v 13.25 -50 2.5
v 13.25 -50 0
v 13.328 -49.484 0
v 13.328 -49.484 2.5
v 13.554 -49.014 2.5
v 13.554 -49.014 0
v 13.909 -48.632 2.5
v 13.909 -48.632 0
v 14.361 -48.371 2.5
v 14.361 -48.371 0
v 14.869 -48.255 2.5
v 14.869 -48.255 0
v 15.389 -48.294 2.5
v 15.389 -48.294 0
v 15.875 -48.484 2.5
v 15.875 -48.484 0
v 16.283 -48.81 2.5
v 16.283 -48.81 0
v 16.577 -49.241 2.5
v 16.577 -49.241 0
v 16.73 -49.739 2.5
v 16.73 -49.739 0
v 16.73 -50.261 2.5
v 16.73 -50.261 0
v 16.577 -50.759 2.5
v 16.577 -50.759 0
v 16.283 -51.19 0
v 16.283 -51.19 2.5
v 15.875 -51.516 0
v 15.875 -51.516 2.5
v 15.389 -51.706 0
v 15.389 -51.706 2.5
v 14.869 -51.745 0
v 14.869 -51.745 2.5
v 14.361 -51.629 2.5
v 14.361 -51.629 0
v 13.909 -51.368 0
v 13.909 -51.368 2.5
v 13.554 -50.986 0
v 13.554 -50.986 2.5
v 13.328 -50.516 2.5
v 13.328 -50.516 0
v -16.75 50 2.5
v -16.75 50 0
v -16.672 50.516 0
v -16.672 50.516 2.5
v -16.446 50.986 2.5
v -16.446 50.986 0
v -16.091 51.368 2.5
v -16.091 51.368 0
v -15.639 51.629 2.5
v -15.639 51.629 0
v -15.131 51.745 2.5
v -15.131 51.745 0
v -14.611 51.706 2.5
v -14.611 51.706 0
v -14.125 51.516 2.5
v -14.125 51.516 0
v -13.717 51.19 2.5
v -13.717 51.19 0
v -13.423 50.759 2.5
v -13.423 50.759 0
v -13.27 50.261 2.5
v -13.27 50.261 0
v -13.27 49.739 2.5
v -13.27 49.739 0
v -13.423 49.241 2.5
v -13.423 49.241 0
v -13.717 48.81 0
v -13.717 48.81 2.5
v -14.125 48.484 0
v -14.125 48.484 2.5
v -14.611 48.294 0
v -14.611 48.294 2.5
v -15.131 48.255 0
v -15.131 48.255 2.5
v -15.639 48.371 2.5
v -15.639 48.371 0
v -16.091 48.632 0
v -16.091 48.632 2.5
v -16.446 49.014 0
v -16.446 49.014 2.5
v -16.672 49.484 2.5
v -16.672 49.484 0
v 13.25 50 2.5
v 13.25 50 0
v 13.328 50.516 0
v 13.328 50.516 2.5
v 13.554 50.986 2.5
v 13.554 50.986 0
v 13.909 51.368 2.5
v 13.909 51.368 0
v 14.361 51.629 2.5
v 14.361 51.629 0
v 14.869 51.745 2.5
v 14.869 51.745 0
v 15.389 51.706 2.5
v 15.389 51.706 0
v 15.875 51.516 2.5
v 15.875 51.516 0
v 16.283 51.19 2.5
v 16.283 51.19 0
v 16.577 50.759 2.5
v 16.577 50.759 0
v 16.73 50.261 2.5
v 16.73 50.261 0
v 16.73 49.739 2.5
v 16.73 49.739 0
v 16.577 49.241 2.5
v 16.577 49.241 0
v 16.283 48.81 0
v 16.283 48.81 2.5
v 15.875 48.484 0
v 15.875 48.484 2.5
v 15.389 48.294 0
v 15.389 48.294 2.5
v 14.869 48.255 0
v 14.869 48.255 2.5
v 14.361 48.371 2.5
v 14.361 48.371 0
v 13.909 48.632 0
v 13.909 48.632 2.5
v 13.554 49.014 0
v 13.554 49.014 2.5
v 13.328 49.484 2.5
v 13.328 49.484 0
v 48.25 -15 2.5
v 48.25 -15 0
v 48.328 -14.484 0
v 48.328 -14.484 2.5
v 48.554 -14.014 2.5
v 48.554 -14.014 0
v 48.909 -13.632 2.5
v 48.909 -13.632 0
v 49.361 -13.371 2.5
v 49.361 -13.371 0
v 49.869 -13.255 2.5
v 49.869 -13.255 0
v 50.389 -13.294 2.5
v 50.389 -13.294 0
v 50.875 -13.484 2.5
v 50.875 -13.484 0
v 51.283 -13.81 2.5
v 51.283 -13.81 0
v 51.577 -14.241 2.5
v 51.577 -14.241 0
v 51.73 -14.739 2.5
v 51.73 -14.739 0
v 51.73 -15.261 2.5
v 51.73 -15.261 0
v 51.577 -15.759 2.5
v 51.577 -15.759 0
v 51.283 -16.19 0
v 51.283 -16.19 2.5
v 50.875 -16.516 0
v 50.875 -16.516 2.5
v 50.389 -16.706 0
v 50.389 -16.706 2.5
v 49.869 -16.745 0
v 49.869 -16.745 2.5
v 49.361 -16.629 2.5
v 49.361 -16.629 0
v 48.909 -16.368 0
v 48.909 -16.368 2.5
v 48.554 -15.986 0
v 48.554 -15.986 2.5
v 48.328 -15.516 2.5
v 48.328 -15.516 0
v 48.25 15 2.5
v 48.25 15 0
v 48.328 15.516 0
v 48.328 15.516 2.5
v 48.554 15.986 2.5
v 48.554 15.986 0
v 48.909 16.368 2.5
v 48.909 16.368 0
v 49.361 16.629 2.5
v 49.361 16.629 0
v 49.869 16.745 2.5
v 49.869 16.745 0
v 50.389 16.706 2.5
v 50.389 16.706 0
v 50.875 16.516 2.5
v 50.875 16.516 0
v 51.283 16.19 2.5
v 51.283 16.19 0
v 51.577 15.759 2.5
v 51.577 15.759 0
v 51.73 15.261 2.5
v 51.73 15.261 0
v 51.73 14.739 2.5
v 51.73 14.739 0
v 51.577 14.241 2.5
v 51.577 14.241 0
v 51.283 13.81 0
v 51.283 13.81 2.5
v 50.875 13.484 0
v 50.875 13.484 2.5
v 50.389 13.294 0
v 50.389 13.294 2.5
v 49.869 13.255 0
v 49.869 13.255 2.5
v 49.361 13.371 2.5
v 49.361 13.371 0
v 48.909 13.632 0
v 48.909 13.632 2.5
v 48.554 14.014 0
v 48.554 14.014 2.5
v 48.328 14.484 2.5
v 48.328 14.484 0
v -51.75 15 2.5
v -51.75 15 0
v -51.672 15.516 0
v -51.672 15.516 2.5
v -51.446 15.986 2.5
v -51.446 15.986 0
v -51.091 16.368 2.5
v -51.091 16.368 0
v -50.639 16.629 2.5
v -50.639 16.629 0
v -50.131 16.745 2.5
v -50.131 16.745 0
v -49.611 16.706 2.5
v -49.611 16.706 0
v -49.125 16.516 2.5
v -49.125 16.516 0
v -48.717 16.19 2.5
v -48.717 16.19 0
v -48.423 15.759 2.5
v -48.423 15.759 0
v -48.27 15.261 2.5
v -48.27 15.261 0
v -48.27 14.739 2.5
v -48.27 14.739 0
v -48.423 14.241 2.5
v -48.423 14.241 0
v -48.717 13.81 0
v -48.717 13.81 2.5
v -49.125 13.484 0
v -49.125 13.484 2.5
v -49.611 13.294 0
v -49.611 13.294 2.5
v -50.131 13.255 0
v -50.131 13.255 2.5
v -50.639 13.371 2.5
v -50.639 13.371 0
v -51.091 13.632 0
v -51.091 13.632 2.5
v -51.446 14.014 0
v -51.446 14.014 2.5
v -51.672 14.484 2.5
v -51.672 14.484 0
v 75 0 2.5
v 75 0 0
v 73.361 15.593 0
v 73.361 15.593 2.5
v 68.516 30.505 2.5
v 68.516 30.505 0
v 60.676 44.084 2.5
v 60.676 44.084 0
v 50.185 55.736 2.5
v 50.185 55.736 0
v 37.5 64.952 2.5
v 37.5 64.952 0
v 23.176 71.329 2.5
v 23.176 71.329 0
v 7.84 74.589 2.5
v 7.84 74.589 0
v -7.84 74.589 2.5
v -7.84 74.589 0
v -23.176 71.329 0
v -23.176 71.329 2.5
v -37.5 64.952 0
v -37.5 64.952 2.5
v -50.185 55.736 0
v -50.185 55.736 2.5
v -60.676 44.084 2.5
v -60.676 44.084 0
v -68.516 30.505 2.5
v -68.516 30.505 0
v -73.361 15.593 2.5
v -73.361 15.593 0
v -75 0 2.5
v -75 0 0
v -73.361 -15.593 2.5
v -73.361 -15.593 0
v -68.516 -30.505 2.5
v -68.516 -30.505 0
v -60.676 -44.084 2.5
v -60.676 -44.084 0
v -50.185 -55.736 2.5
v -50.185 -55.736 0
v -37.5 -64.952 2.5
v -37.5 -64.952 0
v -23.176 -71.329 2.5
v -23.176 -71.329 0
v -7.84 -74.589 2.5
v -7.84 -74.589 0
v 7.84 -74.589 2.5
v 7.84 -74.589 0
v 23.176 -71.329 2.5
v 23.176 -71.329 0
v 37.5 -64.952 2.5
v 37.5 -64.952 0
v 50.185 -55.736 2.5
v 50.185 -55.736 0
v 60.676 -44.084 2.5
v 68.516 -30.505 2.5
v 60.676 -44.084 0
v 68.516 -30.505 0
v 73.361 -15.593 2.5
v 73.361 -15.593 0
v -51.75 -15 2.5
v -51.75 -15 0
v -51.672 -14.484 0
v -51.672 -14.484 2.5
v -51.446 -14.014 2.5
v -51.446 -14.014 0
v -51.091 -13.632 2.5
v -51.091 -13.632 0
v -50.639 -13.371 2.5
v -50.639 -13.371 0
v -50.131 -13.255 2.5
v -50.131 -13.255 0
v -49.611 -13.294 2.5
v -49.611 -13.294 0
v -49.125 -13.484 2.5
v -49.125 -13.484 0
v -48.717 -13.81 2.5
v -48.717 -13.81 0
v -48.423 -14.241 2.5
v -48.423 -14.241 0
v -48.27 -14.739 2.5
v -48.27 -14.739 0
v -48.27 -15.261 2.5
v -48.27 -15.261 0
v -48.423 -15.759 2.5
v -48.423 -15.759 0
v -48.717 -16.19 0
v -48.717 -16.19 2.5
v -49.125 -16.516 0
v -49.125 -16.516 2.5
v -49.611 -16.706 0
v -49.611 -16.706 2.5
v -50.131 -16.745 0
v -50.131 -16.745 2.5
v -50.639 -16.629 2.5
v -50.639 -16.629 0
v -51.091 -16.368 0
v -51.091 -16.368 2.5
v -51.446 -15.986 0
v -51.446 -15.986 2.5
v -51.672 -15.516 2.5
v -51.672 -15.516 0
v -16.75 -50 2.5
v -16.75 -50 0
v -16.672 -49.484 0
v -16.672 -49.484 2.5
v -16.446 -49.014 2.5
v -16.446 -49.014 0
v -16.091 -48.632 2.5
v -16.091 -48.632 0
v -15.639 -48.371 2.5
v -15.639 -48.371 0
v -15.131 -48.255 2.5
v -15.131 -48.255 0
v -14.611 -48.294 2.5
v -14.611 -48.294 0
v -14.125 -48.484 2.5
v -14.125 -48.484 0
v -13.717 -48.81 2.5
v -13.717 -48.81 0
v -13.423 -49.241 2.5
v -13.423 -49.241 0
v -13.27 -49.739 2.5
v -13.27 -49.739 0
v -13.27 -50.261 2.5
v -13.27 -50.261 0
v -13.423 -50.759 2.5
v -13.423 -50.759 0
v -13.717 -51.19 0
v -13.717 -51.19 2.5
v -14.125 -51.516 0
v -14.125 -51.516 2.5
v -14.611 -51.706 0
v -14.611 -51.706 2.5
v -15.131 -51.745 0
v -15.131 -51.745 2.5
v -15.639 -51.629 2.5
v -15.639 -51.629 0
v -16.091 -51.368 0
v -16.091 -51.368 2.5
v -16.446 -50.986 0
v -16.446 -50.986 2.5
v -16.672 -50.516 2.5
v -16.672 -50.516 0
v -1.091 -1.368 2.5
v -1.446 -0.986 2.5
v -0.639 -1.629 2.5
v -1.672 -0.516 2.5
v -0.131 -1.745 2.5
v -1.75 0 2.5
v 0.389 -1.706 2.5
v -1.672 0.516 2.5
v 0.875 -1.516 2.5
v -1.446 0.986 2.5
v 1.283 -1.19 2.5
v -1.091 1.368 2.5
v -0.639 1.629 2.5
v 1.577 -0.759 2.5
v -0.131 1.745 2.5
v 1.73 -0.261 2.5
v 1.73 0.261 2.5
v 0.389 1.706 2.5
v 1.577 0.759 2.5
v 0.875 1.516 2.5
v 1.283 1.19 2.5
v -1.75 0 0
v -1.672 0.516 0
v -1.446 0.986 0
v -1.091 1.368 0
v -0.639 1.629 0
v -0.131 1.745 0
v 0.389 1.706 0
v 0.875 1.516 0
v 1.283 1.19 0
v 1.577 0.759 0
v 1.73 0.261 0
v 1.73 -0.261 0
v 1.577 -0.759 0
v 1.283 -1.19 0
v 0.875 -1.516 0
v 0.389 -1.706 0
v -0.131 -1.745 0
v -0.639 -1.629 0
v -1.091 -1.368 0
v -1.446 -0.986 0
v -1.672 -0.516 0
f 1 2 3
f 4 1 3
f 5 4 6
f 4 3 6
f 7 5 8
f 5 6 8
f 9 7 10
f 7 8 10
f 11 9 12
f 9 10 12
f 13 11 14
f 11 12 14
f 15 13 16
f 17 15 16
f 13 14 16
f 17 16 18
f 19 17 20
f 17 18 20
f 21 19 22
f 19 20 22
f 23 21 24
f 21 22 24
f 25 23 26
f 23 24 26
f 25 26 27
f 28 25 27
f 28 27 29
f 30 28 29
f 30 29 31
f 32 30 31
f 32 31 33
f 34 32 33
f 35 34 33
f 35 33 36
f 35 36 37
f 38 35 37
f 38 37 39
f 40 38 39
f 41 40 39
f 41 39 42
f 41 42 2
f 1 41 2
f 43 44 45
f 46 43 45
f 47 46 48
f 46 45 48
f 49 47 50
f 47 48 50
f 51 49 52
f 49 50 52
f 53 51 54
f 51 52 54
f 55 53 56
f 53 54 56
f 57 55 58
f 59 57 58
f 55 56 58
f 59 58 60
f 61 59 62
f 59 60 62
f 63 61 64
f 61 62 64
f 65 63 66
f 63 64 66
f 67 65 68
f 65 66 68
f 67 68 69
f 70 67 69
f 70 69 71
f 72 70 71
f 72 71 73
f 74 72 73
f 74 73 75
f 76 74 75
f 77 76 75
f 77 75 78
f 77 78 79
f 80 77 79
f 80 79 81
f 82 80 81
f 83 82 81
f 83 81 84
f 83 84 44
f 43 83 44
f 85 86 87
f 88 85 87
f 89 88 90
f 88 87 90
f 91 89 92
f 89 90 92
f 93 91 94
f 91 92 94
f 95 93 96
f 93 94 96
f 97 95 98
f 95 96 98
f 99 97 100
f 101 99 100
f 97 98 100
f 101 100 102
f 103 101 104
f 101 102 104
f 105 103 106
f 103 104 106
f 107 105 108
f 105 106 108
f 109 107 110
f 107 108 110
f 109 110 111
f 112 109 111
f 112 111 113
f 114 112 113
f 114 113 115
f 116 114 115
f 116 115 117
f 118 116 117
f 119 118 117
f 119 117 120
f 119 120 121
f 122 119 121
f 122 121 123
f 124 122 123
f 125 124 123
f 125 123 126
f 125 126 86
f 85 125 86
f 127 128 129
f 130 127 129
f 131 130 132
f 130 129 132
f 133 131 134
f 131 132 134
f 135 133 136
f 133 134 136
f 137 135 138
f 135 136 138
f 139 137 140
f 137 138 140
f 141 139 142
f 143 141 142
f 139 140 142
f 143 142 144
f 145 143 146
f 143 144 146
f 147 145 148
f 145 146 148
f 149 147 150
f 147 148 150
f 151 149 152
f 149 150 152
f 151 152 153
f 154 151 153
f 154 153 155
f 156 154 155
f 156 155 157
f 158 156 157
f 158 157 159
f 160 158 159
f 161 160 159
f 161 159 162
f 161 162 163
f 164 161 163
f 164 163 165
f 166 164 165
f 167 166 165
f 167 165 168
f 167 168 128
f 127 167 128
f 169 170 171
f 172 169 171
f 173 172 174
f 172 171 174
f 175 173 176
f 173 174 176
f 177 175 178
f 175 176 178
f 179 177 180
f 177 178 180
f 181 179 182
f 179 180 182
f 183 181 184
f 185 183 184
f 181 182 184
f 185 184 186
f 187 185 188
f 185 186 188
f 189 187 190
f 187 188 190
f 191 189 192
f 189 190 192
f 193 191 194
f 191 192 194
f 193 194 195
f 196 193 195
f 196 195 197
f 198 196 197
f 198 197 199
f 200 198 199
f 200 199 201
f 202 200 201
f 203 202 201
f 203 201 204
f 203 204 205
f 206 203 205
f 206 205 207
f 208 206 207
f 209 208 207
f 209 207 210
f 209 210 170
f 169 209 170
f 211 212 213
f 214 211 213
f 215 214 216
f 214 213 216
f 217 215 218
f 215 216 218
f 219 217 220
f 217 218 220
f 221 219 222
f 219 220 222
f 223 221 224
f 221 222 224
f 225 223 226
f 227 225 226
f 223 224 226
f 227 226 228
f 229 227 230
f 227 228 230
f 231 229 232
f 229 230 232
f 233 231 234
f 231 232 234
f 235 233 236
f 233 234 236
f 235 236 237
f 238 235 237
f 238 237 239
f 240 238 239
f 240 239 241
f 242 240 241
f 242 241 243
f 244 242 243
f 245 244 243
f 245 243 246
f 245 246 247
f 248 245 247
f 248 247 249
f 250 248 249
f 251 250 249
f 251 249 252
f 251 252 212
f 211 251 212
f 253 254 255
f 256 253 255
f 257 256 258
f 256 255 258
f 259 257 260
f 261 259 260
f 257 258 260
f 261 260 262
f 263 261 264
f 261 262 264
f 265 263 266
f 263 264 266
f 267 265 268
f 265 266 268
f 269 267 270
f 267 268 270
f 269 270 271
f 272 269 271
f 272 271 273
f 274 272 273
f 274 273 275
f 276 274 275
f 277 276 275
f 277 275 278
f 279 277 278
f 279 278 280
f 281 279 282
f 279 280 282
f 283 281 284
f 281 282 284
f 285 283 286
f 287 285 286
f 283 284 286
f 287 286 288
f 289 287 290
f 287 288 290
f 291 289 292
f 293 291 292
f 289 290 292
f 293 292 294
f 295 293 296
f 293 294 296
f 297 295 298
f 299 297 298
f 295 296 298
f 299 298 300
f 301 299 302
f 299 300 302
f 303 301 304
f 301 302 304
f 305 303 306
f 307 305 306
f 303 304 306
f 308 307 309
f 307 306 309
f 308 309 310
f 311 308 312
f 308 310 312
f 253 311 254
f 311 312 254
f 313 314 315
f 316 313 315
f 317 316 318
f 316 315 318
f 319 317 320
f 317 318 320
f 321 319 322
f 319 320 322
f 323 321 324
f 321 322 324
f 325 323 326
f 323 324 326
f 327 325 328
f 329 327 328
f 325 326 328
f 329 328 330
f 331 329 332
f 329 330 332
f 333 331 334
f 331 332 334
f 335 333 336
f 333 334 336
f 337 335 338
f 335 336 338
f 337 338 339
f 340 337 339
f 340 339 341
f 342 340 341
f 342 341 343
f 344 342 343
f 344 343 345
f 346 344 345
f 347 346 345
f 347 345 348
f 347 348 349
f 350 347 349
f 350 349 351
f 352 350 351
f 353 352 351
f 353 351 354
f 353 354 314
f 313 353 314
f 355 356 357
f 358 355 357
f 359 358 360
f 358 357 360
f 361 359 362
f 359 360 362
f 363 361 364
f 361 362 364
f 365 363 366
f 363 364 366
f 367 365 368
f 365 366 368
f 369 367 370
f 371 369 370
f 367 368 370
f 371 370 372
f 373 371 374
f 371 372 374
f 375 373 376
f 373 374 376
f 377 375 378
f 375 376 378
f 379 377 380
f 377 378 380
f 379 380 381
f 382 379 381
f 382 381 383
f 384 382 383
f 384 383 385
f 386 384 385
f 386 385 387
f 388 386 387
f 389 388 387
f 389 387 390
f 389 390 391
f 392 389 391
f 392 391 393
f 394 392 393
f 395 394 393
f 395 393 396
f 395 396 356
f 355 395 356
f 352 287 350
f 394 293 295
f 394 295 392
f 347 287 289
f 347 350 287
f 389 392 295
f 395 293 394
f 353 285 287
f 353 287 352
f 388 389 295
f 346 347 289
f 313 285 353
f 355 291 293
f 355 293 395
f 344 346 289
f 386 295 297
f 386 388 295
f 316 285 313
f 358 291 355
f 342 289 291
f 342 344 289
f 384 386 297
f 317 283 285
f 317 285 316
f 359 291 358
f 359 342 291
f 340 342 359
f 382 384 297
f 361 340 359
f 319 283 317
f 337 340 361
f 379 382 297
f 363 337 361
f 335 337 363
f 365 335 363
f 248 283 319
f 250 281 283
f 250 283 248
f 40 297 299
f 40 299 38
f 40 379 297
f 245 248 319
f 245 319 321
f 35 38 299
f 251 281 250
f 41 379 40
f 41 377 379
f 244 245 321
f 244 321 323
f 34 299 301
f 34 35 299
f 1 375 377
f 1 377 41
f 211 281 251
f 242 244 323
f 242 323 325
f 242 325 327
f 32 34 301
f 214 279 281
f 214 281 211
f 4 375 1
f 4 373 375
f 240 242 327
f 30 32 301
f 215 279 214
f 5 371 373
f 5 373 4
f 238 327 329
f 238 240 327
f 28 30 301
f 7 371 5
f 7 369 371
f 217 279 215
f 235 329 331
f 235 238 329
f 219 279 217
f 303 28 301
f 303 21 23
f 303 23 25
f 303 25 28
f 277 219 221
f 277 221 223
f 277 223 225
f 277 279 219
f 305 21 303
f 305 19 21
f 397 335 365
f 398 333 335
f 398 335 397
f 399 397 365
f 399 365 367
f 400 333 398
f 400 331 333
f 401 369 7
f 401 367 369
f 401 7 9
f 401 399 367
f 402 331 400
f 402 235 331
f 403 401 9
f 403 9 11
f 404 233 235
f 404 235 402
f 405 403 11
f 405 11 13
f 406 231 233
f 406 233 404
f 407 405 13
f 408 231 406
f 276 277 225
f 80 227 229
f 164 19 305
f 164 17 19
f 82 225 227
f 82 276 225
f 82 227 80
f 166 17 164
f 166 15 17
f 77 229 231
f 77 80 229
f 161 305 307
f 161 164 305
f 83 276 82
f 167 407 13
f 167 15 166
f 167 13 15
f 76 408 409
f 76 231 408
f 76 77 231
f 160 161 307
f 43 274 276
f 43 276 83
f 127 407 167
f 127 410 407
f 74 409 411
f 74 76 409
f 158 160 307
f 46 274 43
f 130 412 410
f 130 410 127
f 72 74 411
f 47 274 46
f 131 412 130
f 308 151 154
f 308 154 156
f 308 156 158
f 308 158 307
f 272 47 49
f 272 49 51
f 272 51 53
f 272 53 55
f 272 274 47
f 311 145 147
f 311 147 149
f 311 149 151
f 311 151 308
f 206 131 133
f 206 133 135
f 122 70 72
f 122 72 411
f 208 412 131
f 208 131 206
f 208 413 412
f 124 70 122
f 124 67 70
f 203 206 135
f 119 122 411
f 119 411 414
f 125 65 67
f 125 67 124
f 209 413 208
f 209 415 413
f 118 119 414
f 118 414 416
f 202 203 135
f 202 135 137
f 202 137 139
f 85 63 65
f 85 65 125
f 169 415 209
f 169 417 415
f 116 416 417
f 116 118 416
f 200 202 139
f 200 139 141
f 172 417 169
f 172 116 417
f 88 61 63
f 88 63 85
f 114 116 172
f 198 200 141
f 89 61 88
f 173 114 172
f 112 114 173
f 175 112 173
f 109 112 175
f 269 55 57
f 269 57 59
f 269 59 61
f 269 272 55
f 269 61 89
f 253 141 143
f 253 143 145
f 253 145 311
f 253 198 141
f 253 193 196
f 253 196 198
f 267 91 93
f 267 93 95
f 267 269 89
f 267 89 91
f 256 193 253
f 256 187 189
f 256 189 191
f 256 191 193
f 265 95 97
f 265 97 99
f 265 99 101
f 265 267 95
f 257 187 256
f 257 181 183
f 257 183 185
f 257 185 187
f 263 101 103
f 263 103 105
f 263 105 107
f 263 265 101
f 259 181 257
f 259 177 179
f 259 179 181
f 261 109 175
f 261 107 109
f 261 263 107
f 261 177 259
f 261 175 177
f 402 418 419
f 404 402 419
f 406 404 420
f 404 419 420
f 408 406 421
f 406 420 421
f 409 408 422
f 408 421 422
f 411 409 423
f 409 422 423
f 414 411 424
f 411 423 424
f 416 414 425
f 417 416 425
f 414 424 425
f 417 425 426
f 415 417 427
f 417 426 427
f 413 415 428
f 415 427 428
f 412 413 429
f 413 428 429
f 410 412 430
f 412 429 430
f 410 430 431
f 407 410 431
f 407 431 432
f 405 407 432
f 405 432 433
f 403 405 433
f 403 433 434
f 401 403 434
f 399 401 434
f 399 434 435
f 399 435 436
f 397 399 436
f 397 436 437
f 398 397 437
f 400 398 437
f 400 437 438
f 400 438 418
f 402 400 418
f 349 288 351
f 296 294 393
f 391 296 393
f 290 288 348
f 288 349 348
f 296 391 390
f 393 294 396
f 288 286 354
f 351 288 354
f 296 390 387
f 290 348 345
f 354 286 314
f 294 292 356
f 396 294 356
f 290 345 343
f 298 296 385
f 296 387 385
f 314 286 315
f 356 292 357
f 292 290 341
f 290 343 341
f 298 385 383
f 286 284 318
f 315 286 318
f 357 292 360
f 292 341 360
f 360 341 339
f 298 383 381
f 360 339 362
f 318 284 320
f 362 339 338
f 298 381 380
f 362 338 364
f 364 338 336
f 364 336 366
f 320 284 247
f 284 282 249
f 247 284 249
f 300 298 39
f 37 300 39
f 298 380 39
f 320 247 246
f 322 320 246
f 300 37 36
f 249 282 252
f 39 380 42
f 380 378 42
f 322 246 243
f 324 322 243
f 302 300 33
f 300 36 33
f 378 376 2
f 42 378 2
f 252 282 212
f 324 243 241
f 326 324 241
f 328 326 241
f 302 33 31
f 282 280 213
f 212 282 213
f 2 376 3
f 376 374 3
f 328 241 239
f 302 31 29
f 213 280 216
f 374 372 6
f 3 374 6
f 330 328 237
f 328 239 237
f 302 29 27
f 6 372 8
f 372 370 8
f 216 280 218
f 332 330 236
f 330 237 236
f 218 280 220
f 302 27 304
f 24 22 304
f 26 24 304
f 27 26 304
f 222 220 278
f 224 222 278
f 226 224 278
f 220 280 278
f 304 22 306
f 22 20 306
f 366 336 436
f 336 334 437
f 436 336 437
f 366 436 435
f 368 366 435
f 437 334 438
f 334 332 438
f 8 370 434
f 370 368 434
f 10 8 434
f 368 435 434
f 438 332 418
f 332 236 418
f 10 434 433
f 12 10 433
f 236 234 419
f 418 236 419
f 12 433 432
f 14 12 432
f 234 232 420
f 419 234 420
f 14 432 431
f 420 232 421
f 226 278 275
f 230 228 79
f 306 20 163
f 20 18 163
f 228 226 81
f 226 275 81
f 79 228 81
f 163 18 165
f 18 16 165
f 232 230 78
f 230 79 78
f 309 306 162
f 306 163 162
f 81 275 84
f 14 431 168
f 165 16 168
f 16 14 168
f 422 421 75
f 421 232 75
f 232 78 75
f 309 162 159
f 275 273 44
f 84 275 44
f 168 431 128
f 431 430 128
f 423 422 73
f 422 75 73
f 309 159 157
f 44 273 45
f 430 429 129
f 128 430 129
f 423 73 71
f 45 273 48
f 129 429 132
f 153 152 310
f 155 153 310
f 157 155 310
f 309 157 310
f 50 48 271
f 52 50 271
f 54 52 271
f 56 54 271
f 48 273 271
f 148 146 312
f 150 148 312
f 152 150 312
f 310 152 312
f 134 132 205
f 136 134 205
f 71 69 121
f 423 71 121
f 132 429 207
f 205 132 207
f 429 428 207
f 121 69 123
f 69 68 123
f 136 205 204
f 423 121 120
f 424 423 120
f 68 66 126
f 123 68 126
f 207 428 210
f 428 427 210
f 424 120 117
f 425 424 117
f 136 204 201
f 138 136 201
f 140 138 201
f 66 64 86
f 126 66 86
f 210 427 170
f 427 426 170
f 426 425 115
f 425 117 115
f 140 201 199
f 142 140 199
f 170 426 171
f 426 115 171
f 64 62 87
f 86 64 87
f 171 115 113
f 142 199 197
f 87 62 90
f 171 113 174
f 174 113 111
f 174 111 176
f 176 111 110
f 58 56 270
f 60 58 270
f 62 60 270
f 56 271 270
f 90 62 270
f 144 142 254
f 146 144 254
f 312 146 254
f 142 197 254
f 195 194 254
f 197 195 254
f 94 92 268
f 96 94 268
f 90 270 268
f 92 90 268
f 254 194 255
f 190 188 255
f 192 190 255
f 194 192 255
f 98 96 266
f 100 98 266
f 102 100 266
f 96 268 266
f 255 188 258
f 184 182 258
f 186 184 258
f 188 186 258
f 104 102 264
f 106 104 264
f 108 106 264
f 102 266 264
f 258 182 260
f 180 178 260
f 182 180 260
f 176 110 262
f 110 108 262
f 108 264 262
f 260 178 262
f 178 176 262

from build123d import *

# Parameters (mm, degrees)
SKETCH1_R           = 75
BOSS_EXTRUDE1_DEPTH = 2.5
SKETCH2_R           = 1.75
CUT_EXTRUDE1_DEPTH  = 107.09547587
SKETCH3_R           = 1.75
CUT_EXTRUDE2_DEPTH  = 107.09547587


with BuildPart() as part:
    # Sketch1 → Boss-Extrude1 (new body)
    with BuildSketch(Plane.XY):
        Circle(SKETCH1_R)
    extrude(amount=BOSS_EXTRUDE1_DEPTH)

    # Sketch2 → Cut-Extrude1 (cut, through all)
    with BuildSketch(Plane(origin=(0, 0, 0), x_dir=(-1, 0, 0), z_dir=(0, 0, -1))):
        with Locations((-50, 15)):
            Circle(SKETCH2_R)
        with Locations((-50, -15)):
            Circle(SKETCH2_R)
        with Locations((-15, -50)):
            Circle(SKETCH2_R)
        with Locations((15, -50)):
            Circle(SKETCH2_R)
        with Locations((50, -15)):
            Circle(SKETCH2_R)
        with Locations((50, 15)):
            Circle(SKETCH2_R)
        with Locations((-15, 50)):
            Circle(SKETCH2_R)
        with Locations((15, 50)):
            Circle(SKETCH2_R)
    extrude(amount=-CUT_EXTRUDE1_DEPTH, mode=Mode.SUBTRACT)

    # Sketch3 → Cut-Extrude2 (cut, through all)
    with BuildSketch(Plane(origin=(0, 0, 0), x_dir=(-1, 0, 0), z_dir=(0, 0, -1))):
        Circle(SKETCH3_R)
    extrude(amount=-CUT_EXTRUDE2_DEPTH, mode=Mode.SUBTRACT)


solid = part.part
